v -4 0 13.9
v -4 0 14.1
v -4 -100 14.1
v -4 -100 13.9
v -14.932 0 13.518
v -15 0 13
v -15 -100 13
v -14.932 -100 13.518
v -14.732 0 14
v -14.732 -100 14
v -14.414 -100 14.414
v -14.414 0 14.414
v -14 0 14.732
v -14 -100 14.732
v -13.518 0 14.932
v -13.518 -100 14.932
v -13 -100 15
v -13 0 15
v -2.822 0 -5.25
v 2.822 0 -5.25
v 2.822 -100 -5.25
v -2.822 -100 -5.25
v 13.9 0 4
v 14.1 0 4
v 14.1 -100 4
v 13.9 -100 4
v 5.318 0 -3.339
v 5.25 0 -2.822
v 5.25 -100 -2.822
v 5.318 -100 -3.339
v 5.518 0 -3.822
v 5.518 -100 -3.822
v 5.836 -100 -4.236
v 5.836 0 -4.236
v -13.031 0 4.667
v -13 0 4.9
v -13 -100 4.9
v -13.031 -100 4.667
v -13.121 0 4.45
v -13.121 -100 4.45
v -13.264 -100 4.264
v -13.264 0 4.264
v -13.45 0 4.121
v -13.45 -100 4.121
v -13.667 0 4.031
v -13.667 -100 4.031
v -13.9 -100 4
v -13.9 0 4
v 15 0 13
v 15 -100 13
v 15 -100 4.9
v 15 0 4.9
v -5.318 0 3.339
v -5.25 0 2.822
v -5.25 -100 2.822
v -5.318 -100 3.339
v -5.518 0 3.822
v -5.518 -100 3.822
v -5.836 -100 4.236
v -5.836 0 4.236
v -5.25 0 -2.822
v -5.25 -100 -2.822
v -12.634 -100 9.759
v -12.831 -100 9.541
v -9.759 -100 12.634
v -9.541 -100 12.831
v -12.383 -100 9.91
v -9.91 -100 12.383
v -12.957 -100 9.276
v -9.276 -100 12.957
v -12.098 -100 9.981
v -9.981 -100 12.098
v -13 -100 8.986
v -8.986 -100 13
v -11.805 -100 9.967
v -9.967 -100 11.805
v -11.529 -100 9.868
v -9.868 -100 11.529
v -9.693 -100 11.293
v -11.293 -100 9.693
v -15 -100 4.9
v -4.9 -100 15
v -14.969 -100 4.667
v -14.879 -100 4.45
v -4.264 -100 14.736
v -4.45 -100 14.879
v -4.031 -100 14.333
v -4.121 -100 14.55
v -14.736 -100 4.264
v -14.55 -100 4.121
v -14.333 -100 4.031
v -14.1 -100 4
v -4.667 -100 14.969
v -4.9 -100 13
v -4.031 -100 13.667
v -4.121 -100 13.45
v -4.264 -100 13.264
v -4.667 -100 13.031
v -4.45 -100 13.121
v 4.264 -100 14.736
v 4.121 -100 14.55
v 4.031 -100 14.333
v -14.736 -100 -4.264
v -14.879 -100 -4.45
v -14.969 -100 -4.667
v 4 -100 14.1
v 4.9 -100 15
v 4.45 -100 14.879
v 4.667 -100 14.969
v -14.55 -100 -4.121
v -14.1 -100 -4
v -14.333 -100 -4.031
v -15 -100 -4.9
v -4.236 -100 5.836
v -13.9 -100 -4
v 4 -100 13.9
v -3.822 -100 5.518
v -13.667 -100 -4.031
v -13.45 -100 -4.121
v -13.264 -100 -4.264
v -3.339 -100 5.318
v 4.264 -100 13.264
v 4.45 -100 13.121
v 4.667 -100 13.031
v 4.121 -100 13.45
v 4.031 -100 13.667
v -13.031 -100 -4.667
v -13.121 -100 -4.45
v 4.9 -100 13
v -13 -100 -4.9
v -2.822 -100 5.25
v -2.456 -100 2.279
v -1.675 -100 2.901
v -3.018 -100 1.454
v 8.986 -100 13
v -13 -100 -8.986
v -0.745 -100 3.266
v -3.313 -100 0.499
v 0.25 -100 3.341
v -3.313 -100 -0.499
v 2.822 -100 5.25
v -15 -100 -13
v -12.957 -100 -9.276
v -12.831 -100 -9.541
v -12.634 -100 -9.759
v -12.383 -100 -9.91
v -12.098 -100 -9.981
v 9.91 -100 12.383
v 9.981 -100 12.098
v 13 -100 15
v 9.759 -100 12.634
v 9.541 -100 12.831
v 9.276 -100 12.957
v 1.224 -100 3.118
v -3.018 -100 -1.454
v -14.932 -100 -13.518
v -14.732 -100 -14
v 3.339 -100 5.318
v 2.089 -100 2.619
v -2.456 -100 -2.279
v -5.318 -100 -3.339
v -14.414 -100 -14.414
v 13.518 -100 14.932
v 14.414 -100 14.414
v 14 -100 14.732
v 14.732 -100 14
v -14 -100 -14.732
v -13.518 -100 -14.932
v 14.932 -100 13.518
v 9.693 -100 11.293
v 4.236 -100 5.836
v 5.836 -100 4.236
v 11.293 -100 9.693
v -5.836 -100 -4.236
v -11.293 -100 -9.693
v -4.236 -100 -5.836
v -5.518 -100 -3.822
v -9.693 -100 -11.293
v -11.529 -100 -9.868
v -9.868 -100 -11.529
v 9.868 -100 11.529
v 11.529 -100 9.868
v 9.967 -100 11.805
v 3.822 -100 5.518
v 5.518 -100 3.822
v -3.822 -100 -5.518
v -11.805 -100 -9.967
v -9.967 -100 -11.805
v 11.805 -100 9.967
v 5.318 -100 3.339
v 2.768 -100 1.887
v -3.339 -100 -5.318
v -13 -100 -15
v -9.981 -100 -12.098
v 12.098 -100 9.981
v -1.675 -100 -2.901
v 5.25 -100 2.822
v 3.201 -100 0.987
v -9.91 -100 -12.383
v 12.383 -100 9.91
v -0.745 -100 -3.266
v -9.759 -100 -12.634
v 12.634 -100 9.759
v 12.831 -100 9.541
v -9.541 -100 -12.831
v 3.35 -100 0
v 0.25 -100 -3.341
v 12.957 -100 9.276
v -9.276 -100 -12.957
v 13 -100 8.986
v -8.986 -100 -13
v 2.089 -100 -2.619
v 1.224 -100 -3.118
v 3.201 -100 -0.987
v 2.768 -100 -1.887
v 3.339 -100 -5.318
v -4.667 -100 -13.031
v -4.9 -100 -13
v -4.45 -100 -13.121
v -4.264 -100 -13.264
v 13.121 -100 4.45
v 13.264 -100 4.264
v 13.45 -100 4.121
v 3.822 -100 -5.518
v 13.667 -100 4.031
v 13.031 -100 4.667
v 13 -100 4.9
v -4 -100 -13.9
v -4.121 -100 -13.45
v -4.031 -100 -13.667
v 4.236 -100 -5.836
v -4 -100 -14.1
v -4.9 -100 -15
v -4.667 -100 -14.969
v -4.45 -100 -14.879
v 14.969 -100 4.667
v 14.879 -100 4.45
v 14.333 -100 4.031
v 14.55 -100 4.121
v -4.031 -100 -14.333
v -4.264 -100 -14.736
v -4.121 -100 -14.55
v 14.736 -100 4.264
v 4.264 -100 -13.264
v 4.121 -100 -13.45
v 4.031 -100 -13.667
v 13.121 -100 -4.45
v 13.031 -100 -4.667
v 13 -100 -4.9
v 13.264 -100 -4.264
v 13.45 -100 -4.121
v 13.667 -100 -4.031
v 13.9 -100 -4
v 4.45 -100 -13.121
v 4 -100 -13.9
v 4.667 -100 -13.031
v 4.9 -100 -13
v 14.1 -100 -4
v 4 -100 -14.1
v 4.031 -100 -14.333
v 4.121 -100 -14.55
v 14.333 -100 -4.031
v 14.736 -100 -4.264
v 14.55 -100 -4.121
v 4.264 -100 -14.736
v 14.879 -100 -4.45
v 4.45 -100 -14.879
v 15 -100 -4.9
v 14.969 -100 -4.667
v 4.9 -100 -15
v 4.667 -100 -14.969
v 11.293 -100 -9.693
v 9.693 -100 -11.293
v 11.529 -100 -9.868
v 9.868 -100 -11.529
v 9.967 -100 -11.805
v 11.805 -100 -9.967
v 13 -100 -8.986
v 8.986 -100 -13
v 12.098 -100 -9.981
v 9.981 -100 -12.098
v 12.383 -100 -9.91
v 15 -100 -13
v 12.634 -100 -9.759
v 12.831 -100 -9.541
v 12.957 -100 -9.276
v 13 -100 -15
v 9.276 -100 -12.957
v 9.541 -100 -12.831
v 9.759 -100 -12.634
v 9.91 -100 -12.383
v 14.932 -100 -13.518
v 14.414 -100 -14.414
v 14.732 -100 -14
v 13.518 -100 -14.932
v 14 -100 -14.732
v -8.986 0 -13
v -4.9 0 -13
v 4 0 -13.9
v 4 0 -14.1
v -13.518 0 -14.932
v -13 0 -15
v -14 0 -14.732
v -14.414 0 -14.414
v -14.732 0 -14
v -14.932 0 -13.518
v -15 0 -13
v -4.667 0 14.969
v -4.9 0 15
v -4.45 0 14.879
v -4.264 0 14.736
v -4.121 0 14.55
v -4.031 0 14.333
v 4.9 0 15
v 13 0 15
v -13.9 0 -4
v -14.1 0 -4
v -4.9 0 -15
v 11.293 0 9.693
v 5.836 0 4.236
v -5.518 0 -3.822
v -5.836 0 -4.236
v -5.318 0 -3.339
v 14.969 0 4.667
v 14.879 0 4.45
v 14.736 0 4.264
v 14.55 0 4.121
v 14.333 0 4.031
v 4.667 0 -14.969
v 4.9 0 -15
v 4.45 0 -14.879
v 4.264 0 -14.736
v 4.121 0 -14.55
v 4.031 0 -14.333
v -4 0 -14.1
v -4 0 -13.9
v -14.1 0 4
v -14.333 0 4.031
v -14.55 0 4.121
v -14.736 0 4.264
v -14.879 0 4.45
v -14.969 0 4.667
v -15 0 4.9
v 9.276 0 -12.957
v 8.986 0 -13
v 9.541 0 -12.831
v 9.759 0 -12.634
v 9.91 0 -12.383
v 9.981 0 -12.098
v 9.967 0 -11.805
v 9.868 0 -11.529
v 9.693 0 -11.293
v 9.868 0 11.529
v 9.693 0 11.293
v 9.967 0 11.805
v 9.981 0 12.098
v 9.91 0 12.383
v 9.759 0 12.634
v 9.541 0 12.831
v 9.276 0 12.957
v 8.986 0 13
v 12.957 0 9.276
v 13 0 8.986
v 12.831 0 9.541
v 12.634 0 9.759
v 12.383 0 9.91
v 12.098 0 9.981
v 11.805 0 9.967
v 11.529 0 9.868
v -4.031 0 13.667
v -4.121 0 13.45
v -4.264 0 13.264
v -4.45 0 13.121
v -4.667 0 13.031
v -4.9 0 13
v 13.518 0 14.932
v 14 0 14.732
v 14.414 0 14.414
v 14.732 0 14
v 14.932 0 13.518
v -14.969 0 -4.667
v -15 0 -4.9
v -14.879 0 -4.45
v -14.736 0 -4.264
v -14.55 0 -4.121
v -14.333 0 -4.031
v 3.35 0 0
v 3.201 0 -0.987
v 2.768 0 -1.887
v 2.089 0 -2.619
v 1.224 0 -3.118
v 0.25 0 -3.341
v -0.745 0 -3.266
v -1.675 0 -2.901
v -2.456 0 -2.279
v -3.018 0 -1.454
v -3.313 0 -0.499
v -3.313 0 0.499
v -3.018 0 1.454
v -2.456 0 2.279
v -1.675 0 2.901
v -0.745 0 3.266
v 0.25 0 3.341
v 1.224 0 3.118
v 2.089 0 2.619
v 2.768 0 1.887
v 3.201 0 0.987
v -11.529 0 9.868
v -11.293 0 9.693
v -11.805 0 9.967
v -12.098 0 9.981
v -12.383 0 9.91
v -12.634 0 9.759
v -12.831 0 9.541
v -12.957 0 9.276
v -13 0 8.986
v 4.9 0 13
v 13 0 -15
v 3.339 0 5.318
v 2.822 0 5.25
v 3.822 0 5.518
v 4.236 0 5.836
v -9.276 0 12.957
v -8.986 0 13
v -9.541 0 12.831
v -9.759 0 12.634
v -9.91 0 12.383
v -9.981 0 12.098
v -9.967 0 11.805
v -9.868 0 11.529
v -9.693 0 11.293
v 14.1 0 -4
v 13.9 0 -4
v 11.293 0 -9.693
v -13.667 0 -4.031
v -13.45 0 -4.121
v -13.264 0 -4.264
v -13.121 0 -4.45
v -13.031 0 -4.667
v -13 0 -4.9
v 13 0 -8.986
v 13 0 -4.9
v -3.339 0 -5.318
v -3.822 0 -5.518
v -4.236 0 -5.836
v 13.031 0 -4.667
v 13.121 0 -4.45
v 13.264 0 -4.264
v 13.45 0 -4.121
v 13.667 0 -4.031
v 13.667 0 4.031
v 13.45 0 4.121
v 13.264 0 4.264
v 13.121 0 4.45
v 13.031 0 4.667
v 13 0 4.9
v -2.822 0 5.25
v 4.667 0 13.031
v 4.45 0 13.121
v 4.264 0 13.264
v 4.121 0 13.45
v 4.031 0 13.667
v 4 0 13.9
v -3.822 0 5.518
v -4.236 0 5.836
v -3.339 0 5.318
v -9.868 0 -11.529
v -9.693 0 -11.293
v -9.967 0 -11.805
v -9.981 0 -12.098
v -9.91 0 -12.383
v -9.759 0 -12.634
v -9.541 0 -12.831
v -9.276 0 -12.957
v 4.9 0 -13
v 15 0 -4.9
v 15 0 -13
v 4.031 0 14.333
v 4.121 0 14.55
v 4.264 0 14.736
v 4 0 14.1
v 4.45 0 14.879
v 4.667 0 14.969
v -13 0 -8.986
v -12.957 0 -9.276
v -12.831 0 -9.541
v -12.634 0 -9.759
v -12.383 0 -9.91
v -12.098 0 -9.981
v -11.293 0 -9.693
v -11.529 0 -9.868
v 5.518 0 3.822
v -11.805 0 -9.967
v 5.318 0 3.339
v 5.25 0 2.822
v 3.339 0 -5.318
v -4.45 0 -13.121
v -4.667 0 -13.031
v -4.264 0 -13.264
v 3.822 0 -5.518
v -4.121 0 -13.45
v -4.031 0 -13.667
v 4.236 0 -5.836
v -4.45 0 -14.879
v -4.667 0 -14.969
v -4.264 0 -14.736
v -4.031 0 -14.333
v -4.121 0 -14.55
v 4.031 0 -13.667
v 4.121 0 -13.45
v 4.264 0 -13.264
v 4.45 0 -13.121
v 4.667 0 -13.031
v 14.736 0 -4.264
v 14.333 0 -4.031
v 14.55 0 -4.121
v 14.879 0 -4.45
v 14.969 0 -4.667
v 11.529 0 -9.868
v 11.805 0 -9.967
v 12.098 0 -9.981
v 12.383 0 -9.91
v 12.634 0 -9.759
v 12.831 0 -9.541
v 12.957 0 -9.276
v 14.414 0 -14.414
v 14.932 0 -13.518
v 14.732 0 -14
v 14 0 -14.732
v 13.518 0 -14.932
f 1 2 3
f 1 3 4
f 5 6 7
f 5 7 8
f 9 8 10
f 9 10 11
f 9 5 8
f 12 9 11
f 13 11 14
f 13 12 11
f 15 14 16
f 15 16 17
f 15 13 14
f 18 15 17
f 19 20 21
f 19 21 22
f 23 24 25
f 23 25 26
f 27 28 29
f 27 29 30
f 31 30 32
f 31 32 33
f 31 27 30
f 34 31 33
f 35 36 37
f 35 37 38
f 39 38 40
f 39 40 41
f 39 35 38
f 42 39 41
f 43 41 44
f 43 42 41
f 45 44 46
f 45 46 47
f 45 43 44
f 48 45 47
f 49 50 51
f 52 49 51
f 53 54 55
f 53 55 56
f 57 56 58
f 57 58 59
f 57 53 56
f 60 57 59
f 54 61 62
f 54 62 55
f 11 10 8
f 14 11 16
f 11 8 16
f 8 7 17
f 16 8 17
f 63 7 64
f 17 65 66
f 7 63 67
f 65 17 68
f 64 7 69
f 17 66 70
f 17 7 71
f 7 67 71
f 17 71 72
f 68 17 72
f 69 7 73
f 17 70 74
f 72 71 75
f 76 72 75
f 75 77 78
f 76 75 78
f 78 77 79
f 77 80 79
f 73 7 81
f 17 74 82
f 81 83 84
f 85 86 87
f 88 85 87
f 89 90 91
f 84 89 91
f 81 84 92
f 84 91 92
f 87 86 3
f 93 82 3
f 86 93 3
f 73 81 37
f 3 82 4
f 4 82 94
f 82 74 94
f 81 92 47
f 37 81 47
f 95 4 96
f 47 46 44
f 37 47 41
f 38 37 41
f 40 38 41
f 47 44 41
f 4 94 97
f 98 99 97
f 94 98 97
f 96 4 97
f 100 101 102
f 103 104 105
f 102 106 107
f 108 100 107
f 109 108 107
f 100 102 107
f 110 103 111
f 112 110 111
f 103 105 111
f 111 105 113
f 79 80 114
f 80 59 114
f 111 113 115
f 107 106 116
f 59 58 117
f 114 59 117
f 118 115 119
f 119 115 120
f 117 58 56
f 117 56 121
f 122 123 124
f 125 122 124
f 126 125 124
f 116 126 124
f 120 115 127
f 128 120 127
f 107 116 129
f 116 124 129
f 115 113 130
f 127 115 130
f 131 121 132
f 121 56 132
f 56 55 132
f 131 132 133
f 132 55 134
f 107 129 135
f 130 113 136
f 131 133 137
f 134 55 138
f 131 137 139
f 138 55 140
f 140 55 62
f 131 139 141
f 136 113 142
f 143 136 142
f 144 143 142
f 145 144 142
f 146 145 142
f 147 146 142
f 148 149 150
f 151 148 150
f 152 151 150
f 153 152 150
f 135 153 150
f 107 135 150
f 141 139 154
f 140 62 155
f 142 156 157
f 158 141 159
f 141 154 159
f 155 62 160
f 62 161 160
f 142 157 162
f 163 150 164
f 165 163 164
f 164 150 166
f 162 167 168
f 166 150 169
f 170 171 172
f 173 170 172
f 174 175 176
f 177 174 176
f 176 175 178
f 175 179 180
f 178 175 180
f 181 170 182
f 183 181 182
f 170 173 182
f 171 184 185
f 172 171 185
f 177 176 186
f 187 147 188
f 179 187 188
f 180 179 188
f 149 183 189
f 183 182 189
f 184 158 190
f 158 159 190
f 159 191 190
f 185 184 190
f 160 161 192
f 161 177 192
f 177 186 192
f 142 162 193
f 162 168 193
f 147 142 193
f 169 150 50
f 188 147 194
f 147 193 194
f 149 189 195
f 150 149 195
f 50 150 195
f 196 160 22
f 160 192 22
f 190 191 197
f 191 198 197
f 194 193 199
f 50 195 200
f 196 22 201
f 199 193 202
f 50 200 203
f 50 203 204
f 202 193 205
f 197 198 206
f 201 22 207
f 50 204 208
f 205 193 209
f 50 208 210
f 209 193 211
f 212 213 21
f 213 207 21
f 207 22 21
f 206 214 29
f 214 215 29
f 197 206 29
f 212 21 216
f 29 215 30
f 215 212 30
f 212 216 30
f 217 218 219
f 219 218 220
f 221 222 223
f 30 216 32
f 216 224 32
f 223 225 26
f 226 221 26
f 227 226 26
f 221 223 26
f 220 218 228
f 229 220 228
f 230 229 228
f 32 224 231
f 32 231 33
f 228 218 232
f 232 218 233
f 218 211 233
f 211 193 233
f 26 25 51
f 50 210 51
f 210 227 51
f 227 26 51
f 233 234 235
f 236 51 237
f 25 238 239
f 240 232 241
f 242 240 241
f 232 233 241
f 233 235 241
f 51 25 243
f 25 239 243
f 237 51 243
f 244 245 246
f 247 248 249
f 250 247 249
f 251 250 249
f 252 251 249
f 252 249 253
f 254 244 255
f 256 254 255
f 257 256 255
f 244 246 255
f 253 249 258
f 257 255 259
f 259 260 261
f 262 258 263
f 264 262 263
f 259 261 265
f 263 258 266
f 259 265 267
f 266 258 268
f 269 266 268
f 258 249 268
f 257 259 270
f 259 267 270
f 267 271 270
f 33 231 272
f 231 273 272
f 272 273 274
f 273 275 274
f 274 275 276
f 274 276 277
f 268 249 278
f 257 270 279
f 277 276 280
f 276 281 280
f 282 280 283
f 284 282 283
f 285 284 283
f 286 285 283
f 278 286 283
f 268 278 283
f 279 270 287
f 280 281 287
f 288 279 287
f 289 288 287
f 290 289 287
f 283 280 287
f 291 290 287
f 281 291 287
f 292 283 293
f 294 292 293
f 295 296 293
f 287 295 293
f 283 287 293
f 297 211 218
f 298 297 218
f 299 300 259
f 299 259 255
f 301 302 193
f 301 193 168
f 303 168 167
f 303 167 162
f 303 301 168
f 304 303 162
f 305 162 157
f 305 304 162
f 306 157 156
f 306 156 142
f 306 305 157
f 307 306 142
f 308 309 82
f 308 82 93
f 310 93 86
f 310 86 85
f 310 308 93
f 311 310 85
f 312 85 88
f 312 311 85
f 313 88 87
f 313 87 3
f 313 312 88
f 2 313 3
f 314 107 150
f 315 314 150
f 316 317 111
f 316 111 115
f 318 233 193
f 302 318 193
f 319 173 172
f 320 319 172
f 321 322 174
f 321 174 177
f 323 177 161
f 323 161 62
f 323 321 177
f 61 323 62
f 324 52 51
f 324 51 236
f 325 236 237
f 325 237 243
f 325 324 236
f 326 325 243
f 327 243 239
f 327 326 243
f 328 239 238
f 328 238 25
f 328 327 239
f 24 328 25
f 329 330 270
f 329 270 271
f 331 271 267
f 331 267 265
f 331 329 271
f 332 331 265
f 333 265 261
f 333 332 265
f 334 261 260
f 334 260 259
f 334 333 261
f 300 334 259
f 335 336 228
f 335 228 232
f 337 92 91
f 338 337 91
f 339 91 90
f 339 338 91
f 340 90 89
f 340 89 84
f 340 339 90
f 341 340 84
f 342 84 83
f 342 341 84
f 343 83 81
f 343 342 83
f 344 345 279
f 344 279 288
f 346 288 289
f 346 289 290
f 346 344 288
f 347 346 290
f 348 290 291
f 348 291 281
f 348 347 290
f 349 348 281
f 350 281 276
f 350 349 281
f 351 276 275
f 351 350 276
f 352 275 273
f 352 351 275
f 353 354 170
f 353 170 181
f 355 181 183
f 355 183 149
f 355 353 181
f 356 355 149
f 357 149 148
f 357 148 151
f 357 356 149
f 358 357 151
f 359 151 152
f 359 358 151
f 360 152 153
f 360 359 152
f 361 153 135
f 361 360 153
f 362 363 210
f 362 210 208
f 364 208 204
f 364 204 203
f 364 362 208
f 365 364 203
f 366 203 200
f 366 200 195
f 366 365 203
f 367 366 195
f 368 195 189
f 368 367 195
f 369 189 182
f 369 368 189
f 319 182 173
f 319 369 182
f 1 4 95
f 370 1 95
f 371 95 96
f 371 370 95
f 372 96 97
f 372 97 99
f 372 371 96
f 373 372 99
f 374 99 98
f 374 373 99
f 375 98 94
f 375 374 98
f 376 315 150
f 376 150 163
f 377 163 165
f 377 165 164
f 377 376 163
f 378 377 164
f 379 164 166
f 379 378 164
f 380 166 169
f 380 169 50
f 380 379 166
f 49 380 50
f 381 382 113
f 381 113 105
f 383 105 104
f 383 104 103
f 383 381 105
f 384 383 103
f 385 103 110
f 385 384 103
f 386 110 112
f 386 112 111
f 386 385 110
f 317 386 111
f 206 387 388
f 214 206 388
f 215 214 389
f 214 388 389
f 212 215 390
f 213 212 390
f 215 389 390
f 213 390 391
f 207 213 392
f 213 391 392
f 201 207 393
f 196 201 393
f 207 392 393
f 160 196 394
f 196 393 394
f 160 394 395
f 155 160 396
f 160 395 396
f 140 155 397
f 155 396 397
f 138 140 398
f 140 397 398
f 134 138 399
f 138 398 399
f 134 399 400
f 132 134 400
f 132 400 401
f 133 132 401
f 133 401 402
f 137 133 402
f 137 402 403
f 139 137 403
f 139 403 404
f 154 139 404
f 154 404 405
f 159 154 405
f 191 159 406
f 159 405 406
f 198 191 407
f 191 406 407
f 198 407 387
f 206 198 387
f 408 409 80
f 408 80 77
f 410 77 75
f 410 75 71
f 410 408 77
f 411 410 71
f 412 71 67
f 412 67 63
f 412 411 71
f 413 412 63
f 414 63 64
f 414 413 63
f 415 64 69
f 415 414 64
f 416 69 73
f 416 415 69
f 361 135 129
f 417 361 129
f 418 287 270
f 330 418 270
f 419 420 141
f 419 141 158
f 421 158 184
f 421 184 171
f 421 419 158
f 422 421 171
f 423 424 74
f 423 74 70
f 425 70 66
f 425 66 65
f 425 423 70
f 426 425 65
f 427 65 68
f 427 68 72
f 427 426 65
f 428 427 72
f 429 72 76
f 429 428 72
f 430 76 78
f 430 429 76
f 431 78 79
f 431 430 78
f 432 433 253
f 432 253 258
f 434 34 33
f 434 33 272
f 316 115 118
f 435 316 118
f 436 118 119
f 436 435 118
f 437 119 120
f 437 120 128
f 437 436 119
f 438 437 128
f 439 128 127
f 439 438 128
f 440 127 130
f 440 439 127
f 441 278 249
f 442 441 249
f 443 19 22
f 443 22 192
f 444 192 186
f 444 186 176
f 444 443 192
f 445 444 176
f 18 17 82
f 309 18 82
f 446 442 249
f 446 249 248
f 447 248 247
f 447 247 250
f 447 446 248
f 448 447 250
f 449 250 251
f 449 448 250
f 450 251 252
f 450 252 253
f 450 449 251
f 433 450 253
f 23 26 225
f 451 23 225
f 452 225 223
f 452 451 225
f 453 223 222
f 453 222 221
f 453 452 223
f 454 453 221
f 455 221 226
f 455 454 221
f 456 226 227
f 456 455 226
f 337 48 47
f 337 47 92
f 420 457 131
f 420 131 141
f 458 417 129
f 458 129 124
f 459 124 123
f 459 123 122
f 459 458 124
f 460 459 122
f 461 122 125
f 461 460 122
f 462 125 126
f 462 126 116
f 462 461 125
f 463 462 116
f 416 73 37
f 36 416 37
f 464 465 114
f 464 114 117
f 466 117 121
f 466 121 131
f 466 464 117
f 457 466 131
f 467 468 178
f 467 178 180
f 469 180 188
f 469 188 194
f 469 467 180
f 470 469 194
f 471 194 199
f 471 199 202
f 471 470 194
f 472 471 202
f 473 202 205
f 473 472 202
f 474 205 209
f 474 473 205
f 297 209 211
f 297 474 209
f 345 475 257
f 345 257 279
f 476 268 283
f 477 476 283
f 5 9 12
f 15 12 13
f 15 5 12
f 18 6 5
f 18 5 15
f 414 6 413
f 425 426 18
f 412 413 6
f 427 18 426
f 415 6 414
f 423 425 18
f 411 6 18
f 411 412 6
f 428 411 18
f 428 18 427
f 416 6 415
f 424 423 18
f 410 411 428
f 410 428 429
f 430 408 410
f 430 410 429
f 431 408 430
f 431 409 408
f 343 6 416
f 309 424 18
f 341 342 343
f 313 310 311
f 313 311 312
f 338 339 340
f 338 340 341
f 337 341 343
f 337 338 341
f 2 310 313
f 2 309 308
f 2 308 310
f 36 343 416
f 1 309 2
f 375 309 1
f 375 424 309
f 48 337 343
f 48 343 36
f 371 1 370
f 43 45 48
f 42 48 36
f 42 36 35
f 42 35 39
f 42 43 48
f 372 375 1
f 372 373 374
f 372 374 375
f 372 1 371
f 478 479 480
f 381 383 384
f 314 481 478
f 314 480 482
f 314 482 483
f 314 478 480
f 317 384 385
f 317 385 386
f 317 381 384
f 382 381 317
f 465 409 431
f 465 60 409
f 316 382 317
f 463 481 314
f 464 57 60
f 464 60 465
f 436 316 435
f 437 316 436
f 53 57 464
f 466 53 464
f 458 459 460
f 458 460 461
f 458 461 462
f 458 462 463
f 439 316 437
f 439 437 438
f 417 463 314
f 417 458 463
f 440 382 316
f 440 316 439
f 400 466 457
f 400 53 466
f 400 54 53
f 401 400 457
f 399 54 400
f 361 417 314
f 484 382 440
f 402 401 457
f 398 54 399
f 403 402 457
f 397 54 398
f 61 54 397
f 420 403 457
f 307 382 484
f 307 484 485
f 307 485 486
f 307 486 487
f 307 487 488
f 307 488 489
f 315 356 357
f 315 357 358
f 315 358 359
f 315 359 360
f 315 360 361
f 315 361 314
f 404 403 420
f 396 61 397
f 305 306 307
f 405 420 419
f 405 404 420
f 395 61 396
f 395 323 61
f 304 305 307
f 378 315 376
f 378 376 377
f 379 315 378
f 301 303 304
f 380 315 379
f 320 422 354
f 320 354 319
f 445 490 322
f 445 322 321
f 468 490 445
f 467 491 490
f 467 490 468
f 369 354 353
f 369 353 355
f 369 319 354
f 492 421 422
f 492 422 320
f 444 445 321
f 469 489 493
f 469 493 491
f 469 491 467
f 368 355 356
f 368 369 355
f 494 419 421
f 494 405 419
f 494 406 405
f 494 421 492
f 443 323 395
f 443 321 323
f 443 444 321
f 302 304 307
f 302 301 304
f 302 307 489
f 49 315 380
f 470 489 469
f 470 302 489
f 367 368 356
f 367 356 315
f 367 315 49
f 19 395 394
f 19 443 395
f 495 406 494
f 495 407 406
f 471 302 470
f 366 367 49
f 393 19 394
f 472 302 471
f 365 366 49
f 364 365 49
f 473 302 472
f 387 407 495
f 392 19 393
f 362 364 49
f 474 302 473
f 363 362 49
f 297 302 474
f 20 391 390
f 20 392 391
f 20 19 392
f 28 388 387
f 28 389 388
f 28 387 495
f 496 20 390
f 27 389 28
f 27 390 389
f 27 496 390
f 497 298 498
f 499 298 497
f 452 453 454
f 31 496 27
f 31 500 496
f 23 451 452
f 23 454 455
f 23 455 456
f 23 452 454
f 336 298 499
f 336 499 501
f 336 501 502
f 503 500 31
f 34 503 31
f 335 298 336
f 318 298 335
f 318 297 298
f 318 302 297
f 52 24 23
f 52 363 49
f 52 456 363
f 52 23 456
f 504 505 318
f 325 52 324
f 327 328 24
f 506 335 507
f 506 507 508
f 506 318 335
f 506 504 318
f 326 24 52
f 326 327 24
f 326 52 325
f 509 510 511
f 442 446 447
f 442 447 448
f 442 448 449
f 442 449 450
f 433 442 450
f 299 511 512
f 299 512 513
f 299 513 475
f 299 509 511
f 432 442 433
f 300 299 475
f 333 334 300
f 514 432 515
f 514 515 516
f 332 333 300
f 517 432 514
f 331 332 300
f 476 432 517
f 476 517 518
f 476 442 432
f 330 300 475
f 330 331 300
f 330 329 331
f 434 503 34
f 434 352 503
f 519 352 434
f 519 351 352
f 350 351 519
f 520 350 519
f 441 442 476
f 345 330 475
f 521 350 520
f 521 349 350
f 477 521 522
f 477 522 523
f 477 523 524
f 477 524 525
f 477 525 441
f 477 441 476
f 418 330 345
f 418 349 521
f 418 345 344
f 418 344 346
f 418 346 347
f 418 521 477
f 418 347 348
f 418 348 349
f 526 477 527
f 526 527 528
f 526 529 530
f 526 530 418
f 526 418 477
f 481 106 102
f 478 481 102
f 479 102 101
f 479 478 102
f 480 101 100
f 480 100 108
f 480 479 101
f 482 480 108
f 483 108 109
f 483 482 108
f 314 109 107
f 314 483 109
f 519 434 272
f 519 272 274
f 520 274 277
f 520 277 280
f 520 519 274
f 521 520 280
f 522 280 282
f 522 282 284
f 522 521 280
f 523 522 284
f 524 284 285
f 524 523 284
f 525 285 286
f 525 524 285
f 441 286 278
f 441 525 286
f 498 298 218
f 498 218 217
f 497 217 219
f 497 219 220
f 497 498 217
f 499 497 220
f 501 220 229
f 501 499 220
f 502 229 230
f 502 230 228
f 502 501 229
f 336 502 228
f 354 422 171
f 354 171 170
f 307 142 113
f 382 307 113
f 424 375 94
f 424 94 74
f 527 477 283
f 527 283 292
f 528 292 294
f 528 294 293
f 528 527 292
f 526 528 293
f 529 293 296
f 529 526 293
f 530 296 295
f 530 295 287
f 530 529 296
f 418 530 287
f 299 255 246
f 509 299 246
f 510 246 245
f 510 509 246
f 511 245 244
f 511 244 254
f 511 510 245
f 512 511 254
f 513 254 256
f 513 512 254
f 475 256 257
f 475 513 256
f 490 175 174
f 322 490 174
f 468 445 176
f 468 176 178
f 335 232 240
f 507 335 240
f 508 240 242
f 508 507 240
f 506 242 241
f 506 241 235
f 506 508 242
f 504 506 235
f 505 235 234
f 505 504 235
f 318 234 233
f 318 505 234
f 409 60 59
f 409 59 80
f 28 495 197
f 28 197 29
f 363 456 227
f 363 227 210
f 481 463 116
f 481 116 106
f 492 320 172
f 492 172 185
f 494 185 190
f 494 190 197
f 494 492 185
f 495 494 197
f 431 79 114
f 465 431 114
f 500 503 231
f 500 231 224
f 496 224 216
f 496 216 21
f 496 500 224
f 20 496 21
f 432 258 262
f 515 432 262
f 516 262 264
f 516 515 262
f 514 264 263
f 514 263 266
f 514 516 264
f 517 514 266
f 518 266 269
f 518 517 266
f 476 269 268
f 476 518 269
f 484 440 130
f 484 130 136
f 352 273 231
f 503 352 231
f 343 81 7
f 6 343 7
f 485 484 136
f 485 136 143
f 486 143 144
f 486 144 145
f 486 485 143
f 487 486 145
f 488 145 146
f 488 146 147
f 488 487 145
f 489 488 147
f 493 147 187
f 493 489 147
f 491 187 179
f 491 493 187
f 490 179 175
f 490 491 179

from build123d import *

# Parameters (mm, degrees)
SKETCH1_R       = 3.35
EXTRUSION_DEPTH = 100


with BuildPart() as part:
    # Sketch1 → Extrusion (new body)
    with BuildSketch(Plane(origin=(0, 0, 0), x_dir=(1, 0, 0), z_dir=(0, 1, 0))):
        with BuildLine():
            Line((14.1, -4), (13.9, -4))
            ThreePointArc((13.9, -4), (13.263603897, -4.263603897), (13, -4.9))
            Line((13, -4.9), (13, -8.985786438))
            ThreePointArc((13, -8.985786438), (12.382683432, -9.90966597), (11.292893219, -9.692893219))
            Line((11.292893219, -9.692893219), (5.835786438, -4.235786438))
            ThreePointArc((5.835786438, -4.235786438), (5.402240935, -3.58693974), (5.25, -2.821572875))
            Line((5.25, -2.821572875), (5.25, 2.821572875))
            ThreePointArc((5.25, 2.821572875), (5.402240935, 3.58693974), (5.835786438, 4.235786438))
            Line((5.835786438, 4.235786438), (11.292893219, 9.692893219))
            ThreePointArc((11.292893219, 9.692893219), (12.382683432, 9.90966597), (13, 8.985786438))
            Line((13, 8.985786438), (13, 4.9))
            ThreePointArc((13, 4.9), (13.263603897, 4.263603897), (13.9, 4))
            Line((13.9, 4), (14.1, 4))
            ThreePointArc((14.1, 4), (14.736396103, 4.263603897), (15, 4.9))
            Line((15, 4.9), (15, 13))
            ThreePointArc((15, 13), (14.414213562, 14.414213562), (13, 15))
            Line((13, 15), (4.9, 15))
            ThreePointArc((4.9, 15), (4.263603897, 14.736396103), (4, 14.1))
            Line((4, 14.1), (4, 13.9))
            ThreePointArc((4, 13.9), (4.263603897, 13.263603897), (4.9, 13))
            Line((4.9, 13), (8.985786438, 13))
            ThreePointArc((8.985786438, 13), (9.90966597, 12.382683432), (9.692893219, 11.292893219))
            Line((9.692893219, 11.292893219), (4.235786438, 5.835786438))
            ThreePointArc((4.235786438, 5.835786438), (3.58693974, 5.402240935), (2.821572875, 5.25))
            Line((2.821572875, 5.25), (-2.821572875, 5.25))
            ThreePointArc((-2.821572875, 5.25), (-3.58693974, 5.402240935), (-4.235786438, 5.835786438))
            Line((-4.235786438, 5.835786438), (-9.692893219, 11.292893219))
            ThreePointArc((-9.692893219, 11.292893219), (-9.90966597, 12.382683432), (-8.985786438, 13))
            Line((-8.985786438, 13), (-4.9, 13))
            ThreePointArc((-4.9, 13), (-4.263603897, 13.263603897), (-4, 13.9))
            Line((-4, 13.9), (-4, 14.1))
            ThreePointArc((-4, 14.1), (-4.263603897, 14.736396103), (-4.9, 15))
            Line((-4.9, 15), (-13, 15))
            ThreePointArc((-13, 15), (-14.414213562, 14.414213562), (-15, 13))
            Line((-15, 13), (-15, 4.9))
            ThreePointArc((-15, 4.9), (-14.736396103, 4.263603897), (-14.1, 4))
            Line((-14.1, 4), (-13.9, 4))
            ThreePointArc((-13.9, 4), (-13.263603897, 4.263603897), (-13, 4.9))
            Line((-13, 4.9), (-13, 8.985786438))
            ThreePointArc((-13, 8.985786438), (-12.382683432, 9.90966597), (-11.292893219, 9.692893219))
            Line((-11.292893219, 9.692893219), (-5.835786438, 4.235786438))
            ThreePointArc((-5.835786438, 4.235786438), (-5.402240935, 3.58693974), (-5.25, 2.821572875))
            Line((-5.25, 2.821572875), (-5.25, -2.821572875))
            ThreePointArc((-5.25, -2.821572875), (-5.402240935, -3.58693974), (-5.835786438, -4.235786438))
            Line((-5.835786438, -4.235786438), (-11.292893219, -9.692893219))
            ThreePointArc((-11.292893219, -9.692893219), (-12.382683432, -9.90966597), (-13, -8.985786438))
            Line((-13, -8.985786438), (-13, -4.9))
            ThreePointArc((-13, -4.9), (-13.263603897, -4.263603897), (-13.9, -4))
            Line((-13.9, -4), (-14.1, -4))
            ThreePointArc((-14.1, -4), (-14.736396103, -4.263603897), (-15, -4.9))
            Line((-15, -4.9), (-15, -13))
            ThreePointArc((-15, -13), (-14.414213562, -14.414213562), (-13, -15))
            Line((-13, -15), (-4.9, -15))
            ThreePointArc((-4.9, -15), (-4.263603897, -14.736396103), (-4, -14.1))
            Line((-4, -14.1), (-4, -13.9))
            ThreePointArc((-4, -13.9), (-4.263603897, -13.263603897), (-4.9, -13))
            Line((-4.9, -13), (-8.985786438, -13))
            ThreePointArc((-8.985786438, -13), (-9.90966597, -12.382683432), (-9.692893219, -11.292893219))
            Line((-9.692893219, -11.292893219), (-4.235786438, -5.835786438))
            ThreePointArc((-4.235786438, -5.835786438), (-3.58693974, -5.402240935), (-2.821572875, -5.25))
            Line((-2.821572875, -5.25), (2.821572875, -5.25))
            ThreePointArc((2.821572875, -5.25), (3.58693974, -5.402240935), (4.235786438, -5.835786438))
            Line((4.235786438, -5.835786438), (9.692893219, -11.292893219))
            ThreePointArc((9.692893219, -11.292893219), (9.90966597, -12.382683432), (8.985786438, -13))
            Line((8.985786438, -13), (4.9, -13))
            ThreePointArc((4.9, -13), (4.263603897, -13.263603897), (4, -13.9))
            Line((4, -13.9), (4, -14.1))
            ThreePointArc((4, -14.1), (4.263603897, -14.736396103), (4.9, -15))
            Line((4.9, -15), (13, -15))
            ThreePointArc((13, -15), (14.414213562, -14.414213562), (15, -13))
            Line((15, -13), (15, -4.9))
            ThreePointArc((15, -4.9), (14.736396103, -4.263603897), (14.1, -4))
        make_face()
        Circle(SKETCH1_R, mode=Mode.SUBTRACT)
    extrude(amount=-EXTRUSION_DEPTH)


solid = part.part
